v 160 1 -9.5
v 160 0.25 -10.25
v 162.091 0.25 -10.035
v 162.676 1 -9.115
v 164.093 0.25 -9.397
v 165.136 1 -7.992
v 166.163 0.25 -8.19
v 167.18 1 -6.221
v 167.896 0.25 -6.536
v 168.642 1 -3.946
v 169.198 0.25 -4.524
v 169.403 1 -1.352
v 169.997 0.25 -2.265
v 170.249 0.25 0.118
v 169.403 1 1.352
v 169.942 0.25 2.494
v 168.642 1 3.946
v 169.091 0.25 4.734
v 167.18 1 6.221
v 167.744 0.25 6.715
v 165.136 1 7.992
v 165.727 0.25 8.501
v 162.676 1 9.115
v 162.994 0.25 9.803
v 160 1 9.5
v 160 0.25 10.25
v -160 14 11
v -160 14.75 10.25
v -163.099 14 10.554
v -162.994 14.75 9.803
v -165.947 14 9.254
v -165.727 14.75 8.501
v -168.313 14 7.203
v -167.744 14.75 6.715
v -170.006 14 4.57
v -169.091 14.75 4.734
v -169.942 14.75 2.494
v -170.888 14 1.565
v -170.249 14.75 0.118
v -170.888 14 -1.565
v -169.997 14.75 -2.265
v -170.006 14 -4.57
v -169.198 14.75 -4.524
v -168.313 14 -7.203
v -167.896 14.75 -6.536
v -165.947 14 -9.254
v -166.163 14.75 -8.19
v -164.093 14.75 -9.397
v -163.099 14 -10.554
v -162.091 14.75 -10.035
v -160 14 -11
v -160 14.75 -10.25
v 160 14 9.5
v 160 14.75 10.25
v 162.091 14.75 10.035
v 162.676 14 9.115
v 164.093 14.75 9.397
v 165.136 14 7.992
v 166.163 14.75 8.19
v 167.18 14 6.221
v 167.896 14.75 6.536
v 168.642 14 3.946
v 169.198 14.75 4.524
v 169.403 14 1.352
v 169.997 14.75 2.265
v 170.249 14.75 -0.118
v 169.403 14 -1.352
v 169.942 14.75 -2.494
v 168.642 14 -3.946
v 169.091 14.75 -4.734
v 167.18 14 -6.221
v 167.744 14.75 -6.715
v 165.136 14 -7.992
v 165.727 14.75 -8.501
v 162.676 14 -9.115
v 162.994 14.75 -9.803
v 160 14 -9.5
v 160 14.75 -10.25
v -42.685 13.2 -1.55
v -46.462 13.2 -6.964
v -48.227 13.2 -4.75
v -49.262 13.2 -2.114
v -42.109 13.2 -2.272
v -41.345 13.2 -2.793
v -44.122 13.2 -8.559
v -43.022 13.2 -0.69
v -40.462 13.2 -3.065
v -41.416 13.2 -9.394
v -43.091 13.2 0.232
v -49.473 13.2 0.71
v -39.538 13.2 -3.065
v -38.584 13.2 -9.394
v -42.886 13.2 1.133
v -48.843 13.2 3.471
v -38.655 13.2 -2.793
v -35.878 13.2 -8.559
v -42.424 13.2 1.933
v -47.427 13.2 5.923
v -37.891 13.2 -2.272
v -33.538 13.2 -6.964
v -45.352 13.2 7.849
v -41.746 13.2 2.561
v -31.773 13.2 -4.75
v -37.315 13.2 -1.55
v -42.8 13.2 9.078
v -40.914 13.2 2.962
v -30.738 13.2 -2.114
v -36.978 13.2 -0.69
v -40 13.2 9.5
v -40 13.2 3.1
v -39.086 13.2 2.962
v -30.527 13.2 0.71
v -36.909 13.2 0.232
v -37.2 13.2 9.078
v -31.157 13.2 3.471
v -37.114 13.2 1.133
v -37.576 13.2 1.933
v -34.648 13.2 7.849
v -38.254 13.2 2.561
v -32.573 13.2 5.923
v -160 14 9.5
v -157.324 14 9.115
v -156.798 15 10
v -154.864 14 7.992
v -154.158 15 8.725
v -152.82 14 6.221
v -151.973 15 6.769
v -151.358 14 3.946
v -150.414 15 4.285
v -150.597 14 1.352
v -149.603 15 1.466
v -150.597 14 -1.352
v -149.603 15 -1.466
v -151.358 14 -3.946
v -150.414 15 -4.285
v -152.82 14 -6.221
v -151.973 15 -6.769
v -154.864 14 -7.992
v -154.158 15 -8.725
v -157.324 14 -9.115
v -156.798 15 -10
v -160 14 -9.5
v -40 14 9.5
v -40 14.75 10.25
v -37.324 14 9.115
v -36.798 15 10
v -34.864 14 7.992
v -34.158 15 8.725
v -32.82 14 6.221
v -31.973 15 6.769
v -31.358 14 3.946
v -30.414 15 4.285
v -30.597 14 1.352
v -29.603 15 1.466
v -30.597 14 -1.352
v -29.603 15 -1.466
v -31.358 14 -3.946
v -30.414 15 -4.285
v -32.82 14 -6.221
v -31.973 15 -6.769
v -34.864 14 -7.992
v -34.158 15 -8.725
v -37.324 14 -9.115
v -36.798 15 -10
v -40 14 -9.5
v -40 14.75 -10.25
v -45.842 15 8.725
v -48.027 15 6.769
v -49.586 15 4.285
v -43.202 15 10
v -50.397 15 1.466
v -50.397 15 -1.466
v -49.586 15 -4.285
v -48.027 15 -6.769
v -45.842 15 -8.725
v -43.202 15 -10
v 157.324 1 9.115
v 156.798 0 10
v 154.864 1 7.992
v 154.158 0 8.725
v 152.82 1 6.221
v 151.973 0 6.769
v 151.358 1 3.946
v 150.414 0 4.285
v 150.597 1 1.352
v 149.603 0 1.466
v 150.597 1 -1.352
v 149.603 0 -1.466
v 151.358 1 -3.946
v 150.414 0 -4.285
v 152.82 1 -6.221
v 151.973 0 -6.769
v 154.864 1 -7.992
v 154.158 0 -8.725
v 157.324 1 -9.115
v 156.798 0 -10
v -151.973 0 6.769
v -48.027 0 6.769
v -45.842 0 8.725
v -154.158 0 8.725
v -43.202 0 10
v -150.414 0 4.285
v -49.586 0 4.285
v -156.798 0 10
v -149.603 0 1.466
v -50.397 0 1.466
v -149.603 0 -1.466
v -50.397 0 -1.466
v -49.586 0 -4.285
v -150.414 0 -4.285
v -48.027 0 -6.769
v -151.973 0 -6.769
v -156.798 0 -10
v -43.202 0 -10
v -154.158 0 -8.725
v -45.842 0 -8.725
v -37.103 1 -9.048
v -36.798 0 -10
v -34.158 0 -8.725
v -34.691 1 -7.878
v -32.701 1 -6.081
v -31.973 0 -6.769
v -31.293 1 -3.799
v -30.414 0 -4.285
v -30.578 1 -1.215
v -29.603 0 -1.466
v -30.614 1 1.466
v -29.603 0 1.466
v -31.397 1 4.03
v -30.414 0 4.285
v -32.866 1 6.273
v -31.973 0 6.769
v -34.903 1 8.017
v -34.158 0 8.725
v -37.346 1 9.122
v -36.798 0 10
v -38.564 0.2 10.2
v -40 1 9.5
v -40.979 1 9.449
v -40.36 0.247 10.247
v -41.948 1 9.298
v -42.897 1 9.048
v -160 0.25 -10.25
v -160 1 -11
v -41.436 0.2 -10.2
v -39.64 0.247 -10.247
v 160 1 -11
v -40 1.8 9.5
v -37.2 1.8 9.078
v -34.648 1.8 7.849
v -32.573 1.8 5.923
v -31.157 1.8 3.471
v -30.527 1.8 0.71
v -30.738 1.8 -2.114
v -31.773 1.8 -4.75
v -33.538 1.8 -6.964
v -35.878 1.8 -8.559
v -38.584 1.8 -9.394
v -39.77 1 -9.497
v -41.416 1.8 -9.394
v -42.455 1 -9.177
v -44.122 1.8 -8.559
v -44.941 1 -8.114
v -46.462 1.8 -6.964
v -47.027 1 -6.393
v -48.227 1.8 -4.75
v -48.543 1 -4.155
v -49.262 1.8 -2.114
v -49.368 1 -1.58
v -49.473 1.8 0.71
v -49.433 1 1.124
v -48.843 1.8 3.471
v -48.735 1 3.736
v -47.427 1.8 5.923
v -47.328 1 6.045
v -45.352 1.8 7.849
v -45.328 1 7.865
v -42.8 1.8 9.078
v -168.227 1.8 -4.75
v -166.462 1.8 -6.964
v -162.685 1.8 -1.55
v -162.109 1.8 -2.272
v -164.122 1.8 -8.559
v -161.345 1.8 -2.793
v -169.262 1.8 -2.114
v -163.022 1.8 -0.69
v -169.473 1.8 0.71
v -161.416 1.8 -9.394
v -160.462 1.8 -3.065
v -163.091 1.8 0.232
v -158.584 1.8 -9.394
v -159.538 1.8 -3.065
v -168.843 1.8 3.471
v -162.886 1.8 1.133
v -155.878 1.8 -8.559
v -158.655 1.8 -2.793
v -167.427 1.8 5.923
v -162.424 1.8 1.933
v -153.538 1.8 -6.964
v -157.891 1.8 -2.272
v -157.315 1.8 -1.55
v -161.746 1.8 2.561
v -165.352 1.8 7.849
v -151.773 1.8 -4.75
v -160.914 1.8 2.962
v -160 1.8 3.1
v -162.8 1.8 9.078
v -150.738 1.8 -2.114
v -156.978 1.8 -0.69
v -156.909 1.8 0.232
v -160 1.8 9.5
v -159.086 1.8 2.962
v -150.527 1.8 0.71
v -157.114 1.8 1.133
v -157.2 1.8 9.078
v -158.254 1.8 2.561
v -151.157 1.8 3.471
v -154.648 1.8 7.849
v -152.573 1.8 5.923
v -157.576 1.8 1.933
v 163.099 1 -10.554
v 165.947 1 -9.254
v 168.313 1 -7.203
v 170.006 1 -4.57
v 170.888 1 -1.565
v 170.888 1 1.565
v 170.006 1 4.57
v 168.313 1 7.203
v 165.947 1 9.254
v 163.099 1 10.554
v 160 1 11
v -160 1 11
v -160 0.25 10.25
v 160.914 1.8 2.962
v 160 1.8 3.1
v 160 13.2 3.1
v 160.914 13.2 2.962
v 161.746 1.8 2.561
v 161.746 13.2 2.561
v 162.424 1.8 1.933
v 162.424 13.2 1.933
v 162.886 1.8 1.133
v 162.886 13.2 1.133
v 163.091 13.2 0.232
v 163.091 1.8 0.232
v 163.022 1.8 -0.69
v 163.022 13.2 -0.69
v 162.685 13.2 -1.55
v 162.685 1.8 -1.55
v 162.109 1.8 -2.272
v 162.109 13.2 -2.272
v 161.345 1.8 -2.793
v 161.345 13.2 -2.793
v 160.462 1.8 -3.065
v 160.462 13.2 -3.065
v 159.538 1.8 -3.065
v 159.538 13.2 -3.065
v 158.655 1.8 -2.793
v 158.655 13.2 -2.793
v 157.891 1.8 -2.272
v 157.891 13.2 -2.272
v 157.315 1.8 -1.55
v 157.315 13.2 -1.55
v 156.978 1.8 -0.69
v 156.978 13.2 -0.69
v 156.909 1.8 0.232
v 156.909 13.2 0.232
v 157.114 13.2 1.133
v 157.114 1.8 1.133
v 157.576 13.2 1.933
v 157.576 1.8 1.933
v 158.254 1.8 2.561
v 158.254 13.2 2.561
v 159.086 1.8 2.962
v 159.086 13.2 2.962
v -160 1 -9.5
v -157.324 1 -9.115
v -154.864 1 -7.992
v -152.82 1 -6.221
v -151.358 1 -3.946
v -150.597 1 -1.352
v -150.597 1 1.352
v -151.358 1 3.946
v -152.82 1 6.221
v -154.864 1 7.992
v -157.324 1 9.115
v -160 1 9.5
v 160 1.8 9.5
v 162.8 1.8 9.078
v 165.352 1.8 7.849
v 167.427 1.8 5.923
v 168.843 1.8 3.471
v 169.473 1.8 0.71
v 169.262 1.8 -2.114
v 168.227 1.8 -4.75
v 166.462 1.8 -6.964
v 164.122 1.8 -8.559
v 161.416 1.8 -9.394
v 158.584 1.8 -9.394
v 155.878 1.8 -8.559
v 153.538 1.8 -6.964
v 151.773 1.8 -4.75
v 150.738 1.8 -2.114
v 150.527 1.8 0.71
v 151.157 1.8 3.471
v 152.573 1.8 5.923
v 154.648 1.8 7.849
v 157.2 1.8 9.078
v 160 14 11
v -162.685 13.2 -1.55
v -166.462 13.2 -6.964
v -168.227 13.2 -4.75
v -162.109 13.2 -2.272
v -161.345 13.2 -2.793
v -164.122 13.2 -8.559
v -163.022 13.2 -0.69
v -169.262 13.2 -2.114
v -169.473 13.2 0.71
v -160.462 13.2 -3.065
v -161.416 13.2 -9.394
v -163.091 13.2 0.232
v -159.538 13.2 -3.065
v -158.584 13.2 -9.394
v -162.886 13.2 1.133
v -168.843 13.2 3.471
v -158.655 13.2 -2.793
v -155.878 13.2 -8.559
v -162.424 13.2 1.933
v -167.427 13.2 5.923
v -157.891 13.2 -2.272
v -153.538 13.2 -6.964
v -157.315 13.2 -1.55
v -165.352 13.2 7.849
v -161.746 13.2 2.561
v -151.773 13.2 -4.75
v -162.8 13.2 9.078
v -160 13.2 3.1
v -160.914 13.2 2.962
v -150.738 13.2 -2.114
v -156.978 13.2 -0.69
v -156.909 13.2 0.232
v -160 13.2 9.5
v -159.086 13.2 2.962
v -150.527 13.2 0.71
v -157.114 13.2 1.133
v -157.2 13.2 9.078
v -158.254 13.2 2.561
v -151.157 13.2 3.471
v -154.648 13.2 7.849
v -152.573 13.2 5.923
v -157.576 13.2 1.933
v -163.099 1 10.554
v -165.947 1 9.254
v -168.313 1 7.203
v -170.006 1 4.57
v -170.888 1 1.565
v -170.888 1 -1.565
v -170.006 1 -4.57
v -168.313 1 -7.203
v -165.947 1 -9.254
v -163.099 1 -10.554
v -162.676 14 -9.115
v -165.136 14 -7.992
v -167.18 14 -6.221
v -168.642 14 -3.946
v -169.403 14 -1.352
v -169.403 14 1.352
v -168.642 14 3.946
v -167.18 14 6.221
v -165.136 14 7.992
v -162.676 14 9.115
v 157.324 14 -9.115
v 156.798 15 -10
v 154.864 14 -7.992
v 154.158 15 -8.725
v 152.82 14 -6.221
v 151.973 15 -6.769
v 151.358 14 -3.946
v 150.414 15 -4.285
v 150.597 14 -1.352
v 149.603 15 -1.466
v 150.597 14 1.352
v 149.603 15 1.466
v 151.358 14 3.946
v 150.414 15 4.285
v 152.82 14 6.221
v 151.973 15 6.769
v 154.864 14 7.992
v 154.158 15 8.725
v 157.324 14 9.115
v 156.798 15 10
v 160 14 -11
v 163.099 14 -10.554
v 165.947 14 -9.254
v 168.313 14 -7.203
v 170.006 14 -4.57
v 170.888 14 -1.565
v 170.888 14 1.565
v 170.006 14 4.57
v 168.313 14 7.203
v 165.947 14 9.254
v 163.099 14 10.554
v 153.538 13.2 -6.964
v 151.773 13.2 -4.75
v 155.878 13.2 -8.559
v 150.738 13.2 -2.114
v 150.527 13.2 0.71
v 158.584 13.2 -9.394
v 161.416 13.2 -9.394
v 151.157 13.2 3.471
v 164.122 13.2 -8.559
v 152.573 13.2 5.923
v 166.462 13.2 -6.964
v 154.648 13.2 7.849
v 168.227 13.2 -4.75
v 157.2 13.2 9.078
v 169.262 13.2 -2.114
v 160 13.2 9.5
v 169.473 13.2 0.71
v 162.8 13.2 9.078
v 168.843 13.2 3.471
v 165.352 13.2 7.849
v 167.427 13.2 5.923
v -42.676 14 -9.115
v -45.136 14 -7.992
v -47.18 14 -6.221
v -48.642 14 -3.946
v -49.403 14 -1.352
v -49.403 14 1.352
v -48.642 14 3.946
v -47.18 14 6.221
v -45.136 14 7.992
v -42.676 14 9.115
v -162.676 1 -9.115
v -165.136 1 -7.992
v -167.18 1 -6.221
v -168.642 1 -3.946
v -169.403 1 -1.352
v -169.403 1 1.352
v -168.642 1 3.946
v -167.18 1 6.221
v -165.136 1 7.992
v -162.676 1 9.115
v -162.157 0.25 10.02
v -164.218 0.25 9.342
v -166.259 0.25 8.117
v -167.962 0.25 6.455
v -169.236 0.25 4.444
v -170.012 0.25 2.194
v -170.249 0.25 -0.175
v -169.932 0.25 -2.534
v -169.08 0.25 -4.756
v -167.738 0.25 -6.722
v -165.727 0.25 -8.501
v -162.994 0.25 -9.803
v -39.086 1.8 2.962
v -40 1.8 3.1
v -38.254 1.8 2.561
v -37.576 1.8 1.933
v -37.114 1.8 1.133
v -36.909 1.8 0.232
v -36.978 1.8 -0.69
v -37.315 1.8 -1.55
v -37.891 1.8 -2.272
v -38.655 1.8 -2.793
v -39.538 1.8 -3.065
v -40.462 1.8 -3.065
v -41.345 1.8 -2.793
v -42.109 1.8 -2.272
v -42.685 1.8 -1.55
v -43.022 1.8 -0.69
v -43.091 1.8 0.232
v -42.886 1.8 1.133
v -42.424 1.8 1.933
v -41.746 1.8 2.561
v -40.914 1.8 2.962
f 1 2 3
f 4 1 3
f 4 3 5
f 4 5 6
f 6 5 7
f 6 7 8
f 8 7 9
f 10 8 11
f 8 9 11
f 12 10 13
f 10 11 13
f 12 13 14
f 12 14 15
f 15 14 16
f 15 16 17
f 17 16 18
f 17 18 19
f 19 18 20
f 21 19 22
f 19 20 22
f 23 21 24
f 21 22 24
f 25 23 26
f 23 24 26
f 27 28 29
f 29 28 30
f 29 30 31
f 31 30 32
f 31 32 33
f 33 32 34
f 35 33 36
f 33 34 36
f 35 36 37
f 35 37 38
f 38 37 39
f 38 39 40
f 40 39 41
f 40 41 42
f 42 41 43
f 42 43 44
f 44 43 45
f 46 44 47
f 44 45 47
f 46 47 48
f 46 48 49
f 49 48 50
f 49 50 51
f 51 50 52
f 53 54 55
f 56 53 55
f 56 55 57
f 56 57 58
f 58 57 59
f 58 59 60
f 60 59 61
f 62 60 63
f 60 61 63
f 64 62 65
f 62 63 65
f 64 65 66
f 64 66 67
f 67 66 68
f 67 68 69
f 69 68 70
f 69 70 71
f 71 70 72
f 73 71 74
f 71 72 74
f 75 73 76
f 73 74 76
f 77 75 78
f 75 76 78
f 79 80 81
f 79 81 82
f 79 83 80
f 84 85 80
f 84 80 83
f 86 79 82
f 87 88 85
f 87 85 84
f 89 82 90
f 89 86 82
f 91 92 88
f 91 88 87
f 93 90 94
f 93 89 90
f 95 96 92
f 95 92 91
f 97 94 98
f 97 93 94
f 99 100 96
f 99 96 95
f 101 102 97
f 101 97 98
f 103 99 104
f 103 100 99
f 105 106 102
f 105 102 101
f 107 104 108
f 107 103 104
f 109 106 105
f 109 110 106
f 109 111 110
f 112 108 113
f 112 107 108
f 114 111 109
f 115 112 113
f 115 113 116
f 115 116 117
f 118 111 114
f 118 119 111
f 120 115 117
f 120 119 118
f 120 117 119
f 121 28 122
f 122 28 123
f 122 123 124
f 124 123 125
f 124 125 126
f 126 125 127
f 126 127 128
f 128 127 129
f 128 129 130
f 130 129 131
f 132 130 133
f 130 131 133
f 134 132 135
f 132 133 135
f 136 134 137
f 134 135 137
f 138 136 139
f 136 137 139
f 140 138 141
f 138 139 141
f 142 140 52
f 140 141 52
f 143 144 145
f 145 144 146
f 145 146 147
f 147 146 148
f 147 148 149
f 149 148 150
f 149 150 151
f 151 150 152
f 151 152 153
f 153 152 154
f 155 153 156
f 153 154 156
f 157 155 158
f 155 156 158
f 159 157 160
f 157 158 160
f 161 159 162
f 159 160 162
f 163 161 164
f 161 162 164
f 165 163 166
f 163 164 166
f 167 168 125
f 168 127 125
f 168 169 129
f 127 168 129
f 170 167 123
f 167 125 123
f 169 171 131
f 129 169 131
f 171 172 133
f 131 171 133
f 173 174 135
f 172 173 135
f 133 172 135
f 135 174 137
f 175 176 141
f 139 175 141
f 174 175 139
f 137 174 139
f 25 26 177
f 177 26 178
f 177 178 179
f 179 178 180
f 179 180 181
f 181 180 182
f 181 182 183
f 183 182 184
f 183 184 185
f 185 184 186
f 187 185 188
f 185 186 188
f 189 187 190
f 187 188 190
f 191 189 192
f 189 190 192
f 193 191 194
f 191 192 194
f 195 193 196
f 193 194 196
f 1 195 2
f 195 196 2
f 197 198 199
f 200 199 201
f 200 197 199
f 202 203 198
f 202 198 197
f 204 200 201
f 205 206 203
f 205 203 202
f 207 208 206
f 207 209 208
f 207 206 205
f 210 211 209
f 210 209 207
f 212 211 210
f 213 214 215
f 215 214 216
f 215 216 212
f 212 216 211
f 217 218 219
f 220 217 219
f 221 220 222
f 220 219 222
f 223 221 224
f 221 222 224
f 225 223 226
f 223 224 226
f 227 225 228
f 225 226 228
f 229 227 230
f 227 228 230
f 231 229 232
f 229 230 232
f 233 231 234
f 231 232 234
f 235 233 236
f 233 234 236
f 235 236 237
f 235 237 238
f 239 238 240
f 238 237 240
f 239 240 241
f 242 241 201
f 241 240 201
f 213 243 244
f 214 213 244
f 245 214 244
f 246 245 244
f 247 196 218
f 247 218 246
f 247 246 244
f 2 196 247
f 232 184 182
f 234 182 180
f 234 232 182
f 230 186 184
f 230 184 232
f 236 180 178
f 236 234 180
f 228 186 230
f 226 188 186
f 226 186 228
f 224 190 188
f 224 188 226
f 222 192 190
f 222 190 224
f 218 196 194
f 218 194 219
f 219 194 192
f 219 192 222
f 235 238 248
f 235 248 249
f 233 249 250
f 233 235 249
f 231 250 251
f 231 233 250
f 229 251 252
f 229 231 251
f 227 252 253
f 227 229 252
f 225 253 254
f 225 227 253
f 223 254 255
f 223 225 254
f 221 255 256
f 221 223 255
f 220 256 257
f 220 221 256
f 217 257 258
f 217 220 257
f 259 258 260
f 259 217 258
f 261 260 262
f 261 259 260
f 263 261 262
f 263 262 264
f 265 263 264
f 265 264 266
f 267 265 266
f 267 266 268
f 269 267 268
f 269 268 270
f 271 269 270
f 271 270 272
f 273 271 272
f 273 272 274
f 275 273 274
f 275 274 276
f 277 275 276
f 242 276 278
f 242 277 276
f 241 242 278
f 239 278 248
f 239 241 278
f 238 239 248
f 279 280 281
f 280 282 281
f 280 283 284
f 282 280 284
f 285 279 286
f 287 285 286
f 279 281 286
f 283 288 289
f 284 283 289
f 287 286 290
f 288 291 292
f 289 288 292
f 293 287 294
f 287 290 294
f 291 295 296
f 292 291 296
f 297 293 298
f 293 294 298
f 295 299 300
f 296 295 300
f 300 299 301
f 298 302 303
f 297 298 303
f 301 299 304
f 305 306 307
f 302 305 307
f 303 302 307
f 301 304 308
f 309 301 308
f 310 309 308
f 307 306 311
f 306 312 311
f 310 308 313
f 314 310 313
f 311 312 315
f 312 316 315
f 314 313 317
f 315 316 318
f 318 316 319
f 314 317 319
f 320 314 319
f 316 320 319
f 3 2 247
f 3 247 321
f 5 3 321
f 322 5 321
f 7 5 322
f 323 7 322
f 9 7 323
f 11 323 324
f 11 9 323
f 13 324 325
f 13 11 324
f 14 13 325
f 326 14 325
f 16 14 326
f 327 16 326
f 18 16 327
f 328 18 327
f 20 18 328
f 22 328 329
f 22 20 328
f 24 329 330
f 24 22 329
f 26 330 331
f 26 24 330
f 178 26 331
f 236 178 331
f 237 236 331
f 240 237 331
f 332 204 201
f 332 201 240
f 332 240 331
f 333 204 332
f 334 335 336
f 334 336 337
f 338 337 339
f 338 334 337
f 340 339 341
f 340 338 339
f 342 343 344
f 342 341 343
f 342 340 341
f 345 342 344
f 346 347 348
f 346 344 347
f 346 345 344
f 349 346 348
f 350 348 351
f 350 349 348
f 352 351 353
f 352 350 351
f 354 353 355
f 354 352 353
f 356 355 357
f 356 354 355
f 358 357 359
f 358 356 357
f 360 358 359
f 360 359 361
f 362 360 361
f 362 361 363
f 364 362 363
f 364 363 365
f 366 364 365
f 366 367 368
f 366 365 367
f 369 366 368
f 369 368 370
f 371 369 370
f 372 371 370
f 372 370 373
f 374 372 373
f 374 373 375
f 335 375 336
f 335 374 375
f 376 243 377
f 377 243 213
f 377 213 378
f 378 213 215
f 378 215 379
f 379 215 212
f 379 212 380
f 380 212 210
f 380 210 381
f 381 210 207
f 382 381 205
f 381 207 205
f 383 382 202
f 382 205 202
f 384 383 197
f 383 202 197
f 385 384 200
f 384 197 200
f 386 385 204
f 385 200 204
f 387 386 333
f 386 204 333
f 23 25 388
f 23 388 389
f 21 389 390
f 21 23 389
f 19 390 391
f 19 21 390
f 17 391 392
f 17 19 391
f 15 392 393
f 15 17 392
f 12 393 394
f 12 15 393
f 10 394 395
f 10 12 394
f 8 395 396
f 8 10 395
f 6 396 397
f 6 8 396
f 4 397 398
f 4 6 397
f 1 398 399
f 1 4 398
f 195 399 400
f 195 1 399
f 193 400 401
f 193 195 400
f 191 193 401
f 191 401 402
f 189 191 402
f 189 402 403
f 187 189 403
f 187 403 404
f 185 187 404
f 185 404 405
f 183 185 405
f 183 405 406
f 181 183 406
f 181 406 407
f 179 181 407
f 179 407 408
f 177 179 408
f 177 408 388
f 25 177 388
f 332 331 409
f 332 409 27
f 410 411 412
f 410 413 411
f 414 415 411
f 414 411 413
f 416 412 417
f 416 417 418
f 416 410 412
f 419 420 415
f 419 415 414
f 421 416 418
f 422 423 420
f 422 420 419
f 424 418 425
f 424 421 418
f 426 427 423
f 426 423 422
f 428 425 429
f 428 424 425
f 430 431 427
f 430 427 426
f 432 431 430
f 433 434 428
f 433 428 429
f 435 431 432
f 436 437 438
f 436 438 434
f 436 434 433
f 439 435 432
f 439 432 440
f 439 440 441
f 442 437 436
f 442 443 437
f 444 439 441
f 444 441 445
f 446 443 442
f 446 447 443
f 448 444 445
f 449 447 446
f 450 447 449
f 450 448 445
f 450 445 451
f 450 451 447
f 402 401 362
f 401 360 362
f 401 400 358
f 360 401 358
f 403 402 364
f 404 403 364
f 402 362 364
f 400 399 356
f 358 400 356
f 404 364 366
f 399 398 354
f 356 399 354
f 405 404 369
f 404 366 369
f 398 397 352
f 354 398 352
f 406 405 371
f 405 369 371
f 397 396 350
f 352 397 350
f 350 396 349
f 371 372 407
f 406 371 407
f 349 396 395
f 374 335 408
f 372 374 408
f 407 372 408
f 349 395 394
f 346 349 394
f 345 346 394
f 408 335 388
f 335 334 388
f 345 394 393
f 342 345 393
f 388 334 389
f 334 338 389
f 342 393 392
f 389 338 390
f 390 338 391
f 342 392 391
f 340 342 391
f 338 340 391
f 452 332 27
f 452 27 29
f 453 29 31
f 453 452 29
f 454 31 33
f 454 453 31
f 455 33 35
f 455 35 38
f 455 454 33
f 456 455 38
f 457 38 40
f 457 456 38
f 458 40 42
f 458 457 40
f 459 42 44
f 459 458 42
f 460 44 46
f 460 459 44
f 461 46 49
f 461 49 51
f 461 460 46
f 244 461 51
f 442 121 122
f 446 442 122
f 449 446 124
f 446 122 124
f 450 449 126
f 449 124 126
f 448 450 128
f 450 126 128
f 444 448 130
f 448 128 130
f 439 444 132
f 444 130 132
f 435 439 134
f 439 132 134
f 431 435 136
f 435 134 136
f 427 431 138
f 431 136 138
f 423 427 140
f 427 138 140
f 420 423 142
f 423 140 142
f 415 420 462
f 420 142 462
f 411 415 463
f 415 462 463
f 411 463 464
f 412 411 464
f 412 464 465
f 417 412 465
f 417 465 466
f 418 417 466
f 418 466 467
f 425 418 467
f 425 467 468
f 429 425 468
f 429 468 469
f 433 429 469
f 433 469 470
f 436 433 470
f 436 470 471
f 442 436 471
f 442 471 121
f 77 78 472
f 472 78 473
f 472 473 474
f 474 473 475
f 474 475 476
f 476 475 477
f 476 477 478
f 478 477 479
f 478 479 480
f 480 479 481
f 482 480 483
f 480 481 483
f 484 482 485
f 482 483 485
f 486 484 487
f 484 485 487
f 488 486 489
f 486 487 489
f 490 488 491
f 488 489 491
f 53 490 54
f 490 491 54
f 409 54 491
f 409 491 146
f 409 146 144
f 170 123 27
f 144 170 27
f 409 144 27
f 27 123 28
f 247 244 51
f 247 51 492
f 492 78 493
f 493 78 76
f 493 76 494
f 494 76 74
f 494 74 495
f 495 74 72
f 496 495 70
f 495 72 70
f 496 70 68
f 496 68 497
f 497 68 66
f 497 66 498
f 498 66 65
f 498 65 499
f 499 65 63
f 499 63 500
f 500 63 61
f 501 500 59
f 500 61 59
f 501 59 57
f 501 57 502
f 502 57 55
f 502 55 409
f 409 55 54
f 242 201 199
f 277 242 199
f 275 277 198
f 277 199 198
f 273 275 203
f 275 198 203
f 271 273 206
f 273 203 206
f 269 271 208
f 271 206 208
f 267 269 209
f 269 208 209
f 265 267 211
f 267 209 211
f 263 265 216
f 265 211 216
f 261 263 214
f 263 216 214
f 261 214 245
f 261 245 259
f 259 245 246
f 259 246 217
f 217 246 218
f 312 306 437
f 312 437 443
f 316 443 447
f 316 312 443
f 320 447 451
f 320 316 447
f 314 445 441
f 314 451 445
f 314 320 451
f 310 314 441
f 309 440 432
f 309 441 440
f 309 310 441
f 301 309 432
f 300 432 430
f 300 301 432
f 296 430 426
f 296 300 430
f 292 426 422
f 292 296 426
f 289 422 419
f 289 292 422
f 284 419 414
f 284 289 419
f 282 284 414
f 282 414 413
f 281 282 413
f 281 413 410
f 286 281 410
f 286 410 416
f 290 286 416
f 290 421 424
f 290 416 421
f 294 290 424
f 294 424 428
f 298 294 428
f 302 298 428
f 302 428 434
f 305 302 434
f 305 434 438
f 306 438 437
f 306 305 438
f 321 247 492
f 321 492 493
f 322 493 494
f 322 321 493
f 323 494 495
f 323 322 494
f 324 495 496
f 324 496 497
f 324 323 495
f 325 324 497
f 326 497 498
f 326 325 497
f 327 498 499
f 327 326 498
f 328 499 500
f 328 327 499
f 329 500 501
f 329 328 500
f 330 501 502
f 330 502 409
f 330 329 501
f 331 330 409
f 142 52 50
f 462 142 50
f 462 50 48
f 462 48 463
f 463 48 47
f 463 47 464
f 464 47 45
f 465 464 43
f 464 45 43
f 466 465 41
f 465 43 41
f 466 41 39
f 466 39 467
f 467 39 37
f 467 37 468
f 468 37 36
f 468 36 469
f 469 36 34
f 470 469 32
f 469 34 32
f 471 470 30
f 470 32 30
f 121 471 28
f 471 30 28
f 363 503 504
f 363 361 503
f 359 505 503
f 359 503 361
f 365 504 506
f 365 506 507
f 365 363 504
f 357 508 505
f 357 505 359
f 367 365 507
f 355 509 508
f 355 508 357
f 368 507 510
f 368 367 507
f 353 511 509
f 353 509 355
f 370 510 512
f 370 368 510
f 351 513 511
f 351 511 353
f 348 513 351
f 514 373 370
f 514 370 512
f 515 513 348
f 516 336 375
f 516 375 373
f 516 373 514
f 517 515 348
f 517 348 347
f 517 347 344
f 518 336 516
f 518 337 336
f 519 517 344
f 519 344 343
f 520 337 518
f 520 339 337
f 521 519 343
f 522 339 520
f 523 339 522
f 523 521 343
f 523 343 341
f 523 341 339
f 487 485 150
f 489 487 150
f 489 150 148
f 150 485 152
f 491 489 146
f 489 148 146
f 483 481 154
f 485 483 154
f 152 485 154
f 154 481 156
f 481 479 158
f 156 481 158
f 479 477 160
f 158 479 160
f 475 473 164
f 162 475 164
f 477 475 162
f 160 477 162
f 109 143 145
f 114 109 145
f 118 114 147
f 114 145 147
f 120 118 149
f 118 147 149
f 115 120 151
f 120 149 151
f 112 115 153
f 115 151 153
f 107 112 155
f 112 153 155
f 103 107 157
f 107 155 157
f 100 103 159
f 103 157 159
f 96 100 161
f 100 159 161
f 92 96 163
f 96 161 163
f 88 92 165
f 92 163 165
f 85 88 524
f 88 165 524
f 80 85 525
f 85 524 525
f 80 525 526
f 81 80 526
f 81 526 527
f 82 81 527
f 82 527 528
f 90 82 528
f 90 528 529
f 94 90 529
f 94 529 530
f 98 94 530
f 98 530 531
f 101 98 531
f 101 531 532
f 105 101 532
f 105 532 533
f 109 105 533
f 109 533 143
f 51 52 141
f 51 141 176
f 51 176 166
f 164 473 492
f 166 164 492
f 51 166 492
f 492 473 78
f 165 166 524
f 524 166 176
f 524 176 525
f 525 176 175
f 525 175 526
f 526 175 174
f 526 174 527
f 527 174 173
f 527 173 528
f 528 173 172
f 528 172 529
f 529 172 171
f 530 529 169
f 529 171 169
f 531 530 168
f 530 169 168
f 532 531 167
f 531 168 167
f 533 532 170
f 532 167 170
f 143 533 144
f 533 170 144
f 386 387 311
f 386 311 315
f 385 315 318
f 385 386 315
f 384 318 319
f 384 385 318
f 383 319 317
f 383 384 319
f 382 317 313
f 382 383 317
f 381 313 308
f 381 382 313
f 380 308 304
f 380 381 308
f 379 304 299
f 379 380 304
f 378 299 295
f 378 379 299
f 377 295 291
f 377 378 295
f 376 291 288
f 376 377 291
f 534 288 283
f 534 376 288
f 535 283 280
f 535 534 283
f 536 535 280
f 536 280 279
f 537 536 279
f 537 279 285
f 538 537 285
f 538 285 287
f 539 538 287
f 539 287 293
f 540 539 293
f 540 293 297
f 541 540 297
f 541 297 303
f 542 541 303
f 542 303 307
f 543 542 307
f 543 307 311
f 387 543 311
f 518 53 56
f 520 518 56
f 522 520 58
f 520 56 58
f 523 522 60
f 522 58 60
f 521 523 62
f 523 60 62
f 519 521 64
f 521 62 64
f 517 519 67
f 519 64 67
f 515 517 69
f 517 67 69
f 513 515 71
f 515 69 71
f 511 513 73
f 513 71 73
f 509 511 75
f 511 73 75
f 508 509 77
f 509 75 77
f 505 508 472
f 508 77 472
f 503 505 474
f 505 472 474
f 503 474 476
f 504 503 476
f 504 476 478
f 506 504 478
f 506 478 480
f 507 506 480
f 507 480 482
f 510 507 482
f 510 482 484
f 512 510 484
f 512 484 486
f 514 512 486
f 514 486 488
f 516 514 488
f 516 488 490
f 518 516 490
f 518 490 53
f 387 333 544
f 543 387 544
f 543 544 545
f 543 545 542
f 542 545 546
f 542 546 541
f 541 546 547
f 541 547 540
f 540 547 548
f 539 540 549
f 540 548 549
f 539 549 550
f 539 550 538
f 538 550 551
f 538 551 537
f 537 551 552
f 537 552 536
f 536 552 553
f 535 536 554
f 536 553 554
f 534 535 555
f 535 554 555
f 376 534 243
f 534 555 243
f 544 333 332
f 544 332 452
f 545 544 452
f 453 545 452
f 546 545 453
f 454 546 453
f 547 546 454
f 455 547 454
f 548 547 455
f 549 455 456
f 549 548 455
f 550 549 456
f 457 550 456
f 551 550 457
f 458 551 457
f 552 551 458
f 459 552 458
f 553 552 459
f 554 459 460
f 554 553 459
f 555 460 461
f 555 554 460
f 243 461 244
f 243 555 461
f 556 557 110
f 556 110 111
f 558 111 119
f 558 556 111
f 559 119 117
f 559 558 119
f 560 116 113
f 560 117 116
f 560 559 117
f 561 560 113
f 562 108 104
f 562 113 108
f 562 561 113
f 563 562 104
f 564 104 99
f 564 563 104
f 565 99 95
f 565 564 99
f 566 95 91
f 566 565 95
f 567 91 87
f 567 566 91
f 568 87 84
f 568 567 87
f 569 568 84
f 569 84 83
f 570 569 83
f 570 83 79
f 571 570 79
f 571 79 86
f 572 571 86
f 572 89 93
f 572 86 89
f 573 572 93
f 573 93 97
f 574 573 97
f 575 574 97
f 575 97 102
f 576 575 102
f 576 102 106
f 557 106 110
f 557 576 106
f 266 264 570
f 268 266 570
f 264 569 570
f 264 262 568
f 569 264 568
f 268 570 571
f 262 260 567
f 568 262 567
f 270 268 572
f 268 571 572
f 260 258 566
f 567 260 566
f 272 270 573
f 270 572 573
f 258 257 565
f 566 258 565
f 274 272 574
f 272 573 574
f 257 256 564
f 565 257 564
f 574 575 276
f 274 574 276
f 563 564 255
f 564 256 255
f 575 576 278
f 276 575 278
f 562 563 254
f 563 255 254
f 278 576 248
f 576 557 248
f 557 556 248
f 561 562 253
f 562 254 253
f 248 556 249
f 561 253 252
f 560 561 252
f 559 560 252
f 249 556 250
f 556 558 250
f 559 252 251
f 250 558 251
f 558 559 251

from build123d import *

# Parameters (mm, degrees)
SKETCH1_R           = 3.1
BOSS_EXTRUDE1_DEPTH = 15
SKETCH2_R           = 9.5
CUT_EXTRUDE1_DEPTH  = 1.8
CHAMFER2_SIZE       = 1


with BuildPart() as part:
    # Sketch1 → Boss-Extrude1 (new body)
    with BuildSketch(Plane(origin=(0, 0, 0), x_dir=(1, 0, 0), z_dir=(0, 1, 0))):
        with BuildLine():
            Line((-160, 11), (160, 11))
            ThreePointArc((160, 11), (171, 0), (160, -11))
            Line((160, -11), (-160, -11))
            ThreePointArc((-160, -11), (-171, 0), (-160, 11))
        make_face()
        with Locations(Location((-160, 0, 0), (0, 0, 270))):
            Circle(SKETCH1_R, mode=Mode.SUBTRACT)
        with Locations(Location((160, 0, 0), (0, 0, 270))):
            Circle(SKETCH1_R, mode=Mode.SUBTRACT)
        with Locations(Location((-40, 0, 0), (0, 0, 270))):
            Circle(SKETCH1_R, mode=Mode.SUBTRACT)
    extrude(amount=BOSS_EXTRUDE1_DEPTH)

    # Sketch2 → Cut-Extrude1 (cut)
    with BuildSketch(Plane(origin=(0, 15, 0), x_dir=(1, 0, 0), z_dir=(0, 1, 0))):
        with Locations(Location((160, 0, 0), (0, 0, 270))):
            Circle(SKETCH2_R)
        with Locations(Location((-40, 0, 0), (0, 0, 270))):
            Circle(SKETCH2_R)
        with Locations(Location((-160, 0, 0), (0, 0, 270))):
            Circle(SKETCH2_R)
    cut_extrude1 = extrude(amount=-CUT_EXTRUDE1_DEPTH, mode=Mode.SUBTRACT)

    # Chamfer2
    chamfer2_edges = [part.edges().sort_by_distance(p)[0] for p in [
        (171, 15, 0),
        (0, 15, -11),
        (-171, 15, 0),
        (0, 0, -11),
        (171, 0, 0),
        (0, 0, 11),
        (-171, 0, 0),
        (0, 15, 11),
    ]]
    chamfer(chamfer2_edges, length=CHAMFER2_SIZE)

    # Mirror1: Cut-Extrude1 across plane
    add(cut_extrude1.mirror(Plane.ZX.offset(7.5)), mode=Mode.SUBTRACT)

    # Chamfer1: read off the stored shape, not the designer's step
    # Chamfer1: loft between two sections, ruled curve by curve
    chamfer1_from = [
        Edge.make_three_point_arc((-160, 1, 9.5), (-169.5, 1, 0), (-160, 1, -9.5)),
        Edge.make_three_point_arc((-160, 1, -9.5), (-150.5, 1, 0), (-160, 1, 9.5)),
    ]
    chamfer1_to = [
        Edge.make_three_point_arc((-160, 0, 10.5), (-170.5, 0, 0), (-160, 0, -10.5)),
        Edge.make_three_point_arc((-160, 0, -10.5), (-149.5, 0, 0), (-160, 0, 10.5)),
    ]
    chamfer1 = Solid(Shell([*[Face.make_surface_from_curves(chamfer1_from[k], chamfer1_to[k]) for k in range(2)], Face(Wire(chamfer1_from)), Face(Wire(chamfer1_to))]))
    add(chamfer1, mode=Mode.SUBTRACT)

    # Chamfer1 2: loft between two sections, ruled curve by curve
    chamfer1_2_from = [
        Edge.make_three_point_arc((-37.103348559, 1, -9.047619048), (-30.952380952, 1, 2.896651441), (-42.896651441, 1, 9.047619048)),
        Edge.make_three_point_arc((-42.896651441, 1, 9.047619048), (-49.047619048, 1, -2.896651441), (-37.103348559, 1, -9.047619048)),
    ]
    chamfer1_2_to = [
        Edge.make_three_point_arc((-36.798437881, 0, -10), (-30, 0, 3.201562119), (-43.201562119, 0, 10)),
        Edge.make_three_point_arc((-43.201562119, 0, 10), (-50, 0, -3.201562119), (-36.798437881, 0, -10)),
    ]
    chamfer1_2 = Solid(Shell([*[Face.make_surface_from_curves(chamfer1_2_from[k], chamfer1_2_to[k]) for k in range(2)], Face(Wire(chamfer1_2_from)), Face(Wire(chamfer1_2_to))]))
    add(chamfer1_2, mode=Mode.SUBTRACT)

    # Chamfer1 3: loft between two sections, ruled curve by curve
    chamfer1_3_from = [
        Edge.make_three_point_arc((160, 1, 9.5), (150.5, 1, 0), (160, 1, -9.5)),
        Edge.make_three_point_arc((160, 1, -9.5), (169.5, 1, 0), (160, 1, 9.5)),
    ]
    chamfer1_3_to = [
        Edge.make_three_point_arc((160, 0, 10.5), (149.5, 0, 0), (160, 0, -10.5)),
        Edge.make_three_point_arc((160, 0, -10.5), (170.5, 0, 0), (160, 0, 10.5)),
    ]
    chamfer1_3 = Solid(Shell([*[Face.make_surface_from_curves(chamfer1_3_from[k], chamfer1_3_to[k]) for k in range(2)], Face(Wire(chamfer1_3_from)), Face(Wire(chamfer1_3_to))]))
    add(chamfer1_3, mode=Mode.SUBTRACT)

    # Chamfer1 4: loft between two sections, ruled curve by curve
    chamfer1_4_from = [
        Edge.make_three_point_arc((160, 14, 9.5), (169.5, 14, 0), (160, 14, -9.5)),
        Edge.make_three_point_arc((160, 14, -9.5), (150.5, 14, 0), (160, 14, 9.5)),
    ]
    chamfer1_4_to = [
        Edge.make_three_point_arc((160, 15, 10.5), (170.5, 15, 0), (160, 15, -10.5)),
        Edge.make_three_point_arc((160, 15, -10.5), (149.5, 15, 0), (160, 15, 10.5)),
    ]
    chamfer1_4 = Solid(Shell([*[Face.make_surface_from_curves(chamfer1_4_from[k], chamfer1_4_to[k]) for k in range(2)], Face(Wire(chamfer1_4_from)), Face(Wire(chamfer1_4_to))]))
    add(chamfer1_4, mode=Mode.SUBTRACT)

    # Chamfer1 5: loft between two sections, ruled curve by curve
    chamfer1_5_from = [
        Edge.make_three_point_arc((-40, 14, 9.5), (-30.5, 14, 0), (-40, 14, -9.5)),
        Edge.make_three_point_arc((-40, 14, -9.5), (-49.5, 14, 0), (-40, 14, 9.5)),
    ]
    chamfer1_5_to = [
        Edge.make_three_point_arc((-40, 15, 10.5), (-29.5, 15, 0), (-40, 15, -10.5)),
        Edge.make_three_point_arc((-40, 15, -10.5), (-50.5, 15, 0), (-40, 15, 10.5)),
    ]
    chamfer1_5 = Solid(Shell([*[Face.make_surface_from_curves(chamfer1_5_from[k], chamfer1_5_to[k]) for k in range(2)], Face(Wire(chamfer1_5_from)), Face(Wire(chamfer1_5_to))]))
    add(chamfer1_5, mode=Mode.SUBTRACT)

    # Chamfer1 6: loft between two sections, ruled curve by curve
    chamfer1_6_from = [
        Edge.make_three_point_arc((-160, 14, 9.5), (-150.5, 14, 0), (-160, 14, -9.5)),
        Edge.make_three_point_arc((-160, 14, -9.5), (-169.5, 14, 0), (-160, 14, 9.5)),
    ]
    chamfer1_6_to = [
        Edge.make_three_point_arc((-160, 15, 10.5), (-149.5, 15, 0), (-160, 15, -10.5)),
        Edge.make_three_point_arc((-160, 15, -10.5), (-170.5, 15, 0), (-160, 15, 10.5)),
    ]
    chamfer1_6 = Solid(Shell([*[Face.make_surface_from_curves(chamfer1_6_from[k], chamfer1_6_to[k]) for k in range(2)], Face(Wire(chamfer1_6_from)), Face(Wire(chamfer1_6_to))]))
    add(chamfer1_6, mode=Mode.SUBTRACT)


solid = part.part
